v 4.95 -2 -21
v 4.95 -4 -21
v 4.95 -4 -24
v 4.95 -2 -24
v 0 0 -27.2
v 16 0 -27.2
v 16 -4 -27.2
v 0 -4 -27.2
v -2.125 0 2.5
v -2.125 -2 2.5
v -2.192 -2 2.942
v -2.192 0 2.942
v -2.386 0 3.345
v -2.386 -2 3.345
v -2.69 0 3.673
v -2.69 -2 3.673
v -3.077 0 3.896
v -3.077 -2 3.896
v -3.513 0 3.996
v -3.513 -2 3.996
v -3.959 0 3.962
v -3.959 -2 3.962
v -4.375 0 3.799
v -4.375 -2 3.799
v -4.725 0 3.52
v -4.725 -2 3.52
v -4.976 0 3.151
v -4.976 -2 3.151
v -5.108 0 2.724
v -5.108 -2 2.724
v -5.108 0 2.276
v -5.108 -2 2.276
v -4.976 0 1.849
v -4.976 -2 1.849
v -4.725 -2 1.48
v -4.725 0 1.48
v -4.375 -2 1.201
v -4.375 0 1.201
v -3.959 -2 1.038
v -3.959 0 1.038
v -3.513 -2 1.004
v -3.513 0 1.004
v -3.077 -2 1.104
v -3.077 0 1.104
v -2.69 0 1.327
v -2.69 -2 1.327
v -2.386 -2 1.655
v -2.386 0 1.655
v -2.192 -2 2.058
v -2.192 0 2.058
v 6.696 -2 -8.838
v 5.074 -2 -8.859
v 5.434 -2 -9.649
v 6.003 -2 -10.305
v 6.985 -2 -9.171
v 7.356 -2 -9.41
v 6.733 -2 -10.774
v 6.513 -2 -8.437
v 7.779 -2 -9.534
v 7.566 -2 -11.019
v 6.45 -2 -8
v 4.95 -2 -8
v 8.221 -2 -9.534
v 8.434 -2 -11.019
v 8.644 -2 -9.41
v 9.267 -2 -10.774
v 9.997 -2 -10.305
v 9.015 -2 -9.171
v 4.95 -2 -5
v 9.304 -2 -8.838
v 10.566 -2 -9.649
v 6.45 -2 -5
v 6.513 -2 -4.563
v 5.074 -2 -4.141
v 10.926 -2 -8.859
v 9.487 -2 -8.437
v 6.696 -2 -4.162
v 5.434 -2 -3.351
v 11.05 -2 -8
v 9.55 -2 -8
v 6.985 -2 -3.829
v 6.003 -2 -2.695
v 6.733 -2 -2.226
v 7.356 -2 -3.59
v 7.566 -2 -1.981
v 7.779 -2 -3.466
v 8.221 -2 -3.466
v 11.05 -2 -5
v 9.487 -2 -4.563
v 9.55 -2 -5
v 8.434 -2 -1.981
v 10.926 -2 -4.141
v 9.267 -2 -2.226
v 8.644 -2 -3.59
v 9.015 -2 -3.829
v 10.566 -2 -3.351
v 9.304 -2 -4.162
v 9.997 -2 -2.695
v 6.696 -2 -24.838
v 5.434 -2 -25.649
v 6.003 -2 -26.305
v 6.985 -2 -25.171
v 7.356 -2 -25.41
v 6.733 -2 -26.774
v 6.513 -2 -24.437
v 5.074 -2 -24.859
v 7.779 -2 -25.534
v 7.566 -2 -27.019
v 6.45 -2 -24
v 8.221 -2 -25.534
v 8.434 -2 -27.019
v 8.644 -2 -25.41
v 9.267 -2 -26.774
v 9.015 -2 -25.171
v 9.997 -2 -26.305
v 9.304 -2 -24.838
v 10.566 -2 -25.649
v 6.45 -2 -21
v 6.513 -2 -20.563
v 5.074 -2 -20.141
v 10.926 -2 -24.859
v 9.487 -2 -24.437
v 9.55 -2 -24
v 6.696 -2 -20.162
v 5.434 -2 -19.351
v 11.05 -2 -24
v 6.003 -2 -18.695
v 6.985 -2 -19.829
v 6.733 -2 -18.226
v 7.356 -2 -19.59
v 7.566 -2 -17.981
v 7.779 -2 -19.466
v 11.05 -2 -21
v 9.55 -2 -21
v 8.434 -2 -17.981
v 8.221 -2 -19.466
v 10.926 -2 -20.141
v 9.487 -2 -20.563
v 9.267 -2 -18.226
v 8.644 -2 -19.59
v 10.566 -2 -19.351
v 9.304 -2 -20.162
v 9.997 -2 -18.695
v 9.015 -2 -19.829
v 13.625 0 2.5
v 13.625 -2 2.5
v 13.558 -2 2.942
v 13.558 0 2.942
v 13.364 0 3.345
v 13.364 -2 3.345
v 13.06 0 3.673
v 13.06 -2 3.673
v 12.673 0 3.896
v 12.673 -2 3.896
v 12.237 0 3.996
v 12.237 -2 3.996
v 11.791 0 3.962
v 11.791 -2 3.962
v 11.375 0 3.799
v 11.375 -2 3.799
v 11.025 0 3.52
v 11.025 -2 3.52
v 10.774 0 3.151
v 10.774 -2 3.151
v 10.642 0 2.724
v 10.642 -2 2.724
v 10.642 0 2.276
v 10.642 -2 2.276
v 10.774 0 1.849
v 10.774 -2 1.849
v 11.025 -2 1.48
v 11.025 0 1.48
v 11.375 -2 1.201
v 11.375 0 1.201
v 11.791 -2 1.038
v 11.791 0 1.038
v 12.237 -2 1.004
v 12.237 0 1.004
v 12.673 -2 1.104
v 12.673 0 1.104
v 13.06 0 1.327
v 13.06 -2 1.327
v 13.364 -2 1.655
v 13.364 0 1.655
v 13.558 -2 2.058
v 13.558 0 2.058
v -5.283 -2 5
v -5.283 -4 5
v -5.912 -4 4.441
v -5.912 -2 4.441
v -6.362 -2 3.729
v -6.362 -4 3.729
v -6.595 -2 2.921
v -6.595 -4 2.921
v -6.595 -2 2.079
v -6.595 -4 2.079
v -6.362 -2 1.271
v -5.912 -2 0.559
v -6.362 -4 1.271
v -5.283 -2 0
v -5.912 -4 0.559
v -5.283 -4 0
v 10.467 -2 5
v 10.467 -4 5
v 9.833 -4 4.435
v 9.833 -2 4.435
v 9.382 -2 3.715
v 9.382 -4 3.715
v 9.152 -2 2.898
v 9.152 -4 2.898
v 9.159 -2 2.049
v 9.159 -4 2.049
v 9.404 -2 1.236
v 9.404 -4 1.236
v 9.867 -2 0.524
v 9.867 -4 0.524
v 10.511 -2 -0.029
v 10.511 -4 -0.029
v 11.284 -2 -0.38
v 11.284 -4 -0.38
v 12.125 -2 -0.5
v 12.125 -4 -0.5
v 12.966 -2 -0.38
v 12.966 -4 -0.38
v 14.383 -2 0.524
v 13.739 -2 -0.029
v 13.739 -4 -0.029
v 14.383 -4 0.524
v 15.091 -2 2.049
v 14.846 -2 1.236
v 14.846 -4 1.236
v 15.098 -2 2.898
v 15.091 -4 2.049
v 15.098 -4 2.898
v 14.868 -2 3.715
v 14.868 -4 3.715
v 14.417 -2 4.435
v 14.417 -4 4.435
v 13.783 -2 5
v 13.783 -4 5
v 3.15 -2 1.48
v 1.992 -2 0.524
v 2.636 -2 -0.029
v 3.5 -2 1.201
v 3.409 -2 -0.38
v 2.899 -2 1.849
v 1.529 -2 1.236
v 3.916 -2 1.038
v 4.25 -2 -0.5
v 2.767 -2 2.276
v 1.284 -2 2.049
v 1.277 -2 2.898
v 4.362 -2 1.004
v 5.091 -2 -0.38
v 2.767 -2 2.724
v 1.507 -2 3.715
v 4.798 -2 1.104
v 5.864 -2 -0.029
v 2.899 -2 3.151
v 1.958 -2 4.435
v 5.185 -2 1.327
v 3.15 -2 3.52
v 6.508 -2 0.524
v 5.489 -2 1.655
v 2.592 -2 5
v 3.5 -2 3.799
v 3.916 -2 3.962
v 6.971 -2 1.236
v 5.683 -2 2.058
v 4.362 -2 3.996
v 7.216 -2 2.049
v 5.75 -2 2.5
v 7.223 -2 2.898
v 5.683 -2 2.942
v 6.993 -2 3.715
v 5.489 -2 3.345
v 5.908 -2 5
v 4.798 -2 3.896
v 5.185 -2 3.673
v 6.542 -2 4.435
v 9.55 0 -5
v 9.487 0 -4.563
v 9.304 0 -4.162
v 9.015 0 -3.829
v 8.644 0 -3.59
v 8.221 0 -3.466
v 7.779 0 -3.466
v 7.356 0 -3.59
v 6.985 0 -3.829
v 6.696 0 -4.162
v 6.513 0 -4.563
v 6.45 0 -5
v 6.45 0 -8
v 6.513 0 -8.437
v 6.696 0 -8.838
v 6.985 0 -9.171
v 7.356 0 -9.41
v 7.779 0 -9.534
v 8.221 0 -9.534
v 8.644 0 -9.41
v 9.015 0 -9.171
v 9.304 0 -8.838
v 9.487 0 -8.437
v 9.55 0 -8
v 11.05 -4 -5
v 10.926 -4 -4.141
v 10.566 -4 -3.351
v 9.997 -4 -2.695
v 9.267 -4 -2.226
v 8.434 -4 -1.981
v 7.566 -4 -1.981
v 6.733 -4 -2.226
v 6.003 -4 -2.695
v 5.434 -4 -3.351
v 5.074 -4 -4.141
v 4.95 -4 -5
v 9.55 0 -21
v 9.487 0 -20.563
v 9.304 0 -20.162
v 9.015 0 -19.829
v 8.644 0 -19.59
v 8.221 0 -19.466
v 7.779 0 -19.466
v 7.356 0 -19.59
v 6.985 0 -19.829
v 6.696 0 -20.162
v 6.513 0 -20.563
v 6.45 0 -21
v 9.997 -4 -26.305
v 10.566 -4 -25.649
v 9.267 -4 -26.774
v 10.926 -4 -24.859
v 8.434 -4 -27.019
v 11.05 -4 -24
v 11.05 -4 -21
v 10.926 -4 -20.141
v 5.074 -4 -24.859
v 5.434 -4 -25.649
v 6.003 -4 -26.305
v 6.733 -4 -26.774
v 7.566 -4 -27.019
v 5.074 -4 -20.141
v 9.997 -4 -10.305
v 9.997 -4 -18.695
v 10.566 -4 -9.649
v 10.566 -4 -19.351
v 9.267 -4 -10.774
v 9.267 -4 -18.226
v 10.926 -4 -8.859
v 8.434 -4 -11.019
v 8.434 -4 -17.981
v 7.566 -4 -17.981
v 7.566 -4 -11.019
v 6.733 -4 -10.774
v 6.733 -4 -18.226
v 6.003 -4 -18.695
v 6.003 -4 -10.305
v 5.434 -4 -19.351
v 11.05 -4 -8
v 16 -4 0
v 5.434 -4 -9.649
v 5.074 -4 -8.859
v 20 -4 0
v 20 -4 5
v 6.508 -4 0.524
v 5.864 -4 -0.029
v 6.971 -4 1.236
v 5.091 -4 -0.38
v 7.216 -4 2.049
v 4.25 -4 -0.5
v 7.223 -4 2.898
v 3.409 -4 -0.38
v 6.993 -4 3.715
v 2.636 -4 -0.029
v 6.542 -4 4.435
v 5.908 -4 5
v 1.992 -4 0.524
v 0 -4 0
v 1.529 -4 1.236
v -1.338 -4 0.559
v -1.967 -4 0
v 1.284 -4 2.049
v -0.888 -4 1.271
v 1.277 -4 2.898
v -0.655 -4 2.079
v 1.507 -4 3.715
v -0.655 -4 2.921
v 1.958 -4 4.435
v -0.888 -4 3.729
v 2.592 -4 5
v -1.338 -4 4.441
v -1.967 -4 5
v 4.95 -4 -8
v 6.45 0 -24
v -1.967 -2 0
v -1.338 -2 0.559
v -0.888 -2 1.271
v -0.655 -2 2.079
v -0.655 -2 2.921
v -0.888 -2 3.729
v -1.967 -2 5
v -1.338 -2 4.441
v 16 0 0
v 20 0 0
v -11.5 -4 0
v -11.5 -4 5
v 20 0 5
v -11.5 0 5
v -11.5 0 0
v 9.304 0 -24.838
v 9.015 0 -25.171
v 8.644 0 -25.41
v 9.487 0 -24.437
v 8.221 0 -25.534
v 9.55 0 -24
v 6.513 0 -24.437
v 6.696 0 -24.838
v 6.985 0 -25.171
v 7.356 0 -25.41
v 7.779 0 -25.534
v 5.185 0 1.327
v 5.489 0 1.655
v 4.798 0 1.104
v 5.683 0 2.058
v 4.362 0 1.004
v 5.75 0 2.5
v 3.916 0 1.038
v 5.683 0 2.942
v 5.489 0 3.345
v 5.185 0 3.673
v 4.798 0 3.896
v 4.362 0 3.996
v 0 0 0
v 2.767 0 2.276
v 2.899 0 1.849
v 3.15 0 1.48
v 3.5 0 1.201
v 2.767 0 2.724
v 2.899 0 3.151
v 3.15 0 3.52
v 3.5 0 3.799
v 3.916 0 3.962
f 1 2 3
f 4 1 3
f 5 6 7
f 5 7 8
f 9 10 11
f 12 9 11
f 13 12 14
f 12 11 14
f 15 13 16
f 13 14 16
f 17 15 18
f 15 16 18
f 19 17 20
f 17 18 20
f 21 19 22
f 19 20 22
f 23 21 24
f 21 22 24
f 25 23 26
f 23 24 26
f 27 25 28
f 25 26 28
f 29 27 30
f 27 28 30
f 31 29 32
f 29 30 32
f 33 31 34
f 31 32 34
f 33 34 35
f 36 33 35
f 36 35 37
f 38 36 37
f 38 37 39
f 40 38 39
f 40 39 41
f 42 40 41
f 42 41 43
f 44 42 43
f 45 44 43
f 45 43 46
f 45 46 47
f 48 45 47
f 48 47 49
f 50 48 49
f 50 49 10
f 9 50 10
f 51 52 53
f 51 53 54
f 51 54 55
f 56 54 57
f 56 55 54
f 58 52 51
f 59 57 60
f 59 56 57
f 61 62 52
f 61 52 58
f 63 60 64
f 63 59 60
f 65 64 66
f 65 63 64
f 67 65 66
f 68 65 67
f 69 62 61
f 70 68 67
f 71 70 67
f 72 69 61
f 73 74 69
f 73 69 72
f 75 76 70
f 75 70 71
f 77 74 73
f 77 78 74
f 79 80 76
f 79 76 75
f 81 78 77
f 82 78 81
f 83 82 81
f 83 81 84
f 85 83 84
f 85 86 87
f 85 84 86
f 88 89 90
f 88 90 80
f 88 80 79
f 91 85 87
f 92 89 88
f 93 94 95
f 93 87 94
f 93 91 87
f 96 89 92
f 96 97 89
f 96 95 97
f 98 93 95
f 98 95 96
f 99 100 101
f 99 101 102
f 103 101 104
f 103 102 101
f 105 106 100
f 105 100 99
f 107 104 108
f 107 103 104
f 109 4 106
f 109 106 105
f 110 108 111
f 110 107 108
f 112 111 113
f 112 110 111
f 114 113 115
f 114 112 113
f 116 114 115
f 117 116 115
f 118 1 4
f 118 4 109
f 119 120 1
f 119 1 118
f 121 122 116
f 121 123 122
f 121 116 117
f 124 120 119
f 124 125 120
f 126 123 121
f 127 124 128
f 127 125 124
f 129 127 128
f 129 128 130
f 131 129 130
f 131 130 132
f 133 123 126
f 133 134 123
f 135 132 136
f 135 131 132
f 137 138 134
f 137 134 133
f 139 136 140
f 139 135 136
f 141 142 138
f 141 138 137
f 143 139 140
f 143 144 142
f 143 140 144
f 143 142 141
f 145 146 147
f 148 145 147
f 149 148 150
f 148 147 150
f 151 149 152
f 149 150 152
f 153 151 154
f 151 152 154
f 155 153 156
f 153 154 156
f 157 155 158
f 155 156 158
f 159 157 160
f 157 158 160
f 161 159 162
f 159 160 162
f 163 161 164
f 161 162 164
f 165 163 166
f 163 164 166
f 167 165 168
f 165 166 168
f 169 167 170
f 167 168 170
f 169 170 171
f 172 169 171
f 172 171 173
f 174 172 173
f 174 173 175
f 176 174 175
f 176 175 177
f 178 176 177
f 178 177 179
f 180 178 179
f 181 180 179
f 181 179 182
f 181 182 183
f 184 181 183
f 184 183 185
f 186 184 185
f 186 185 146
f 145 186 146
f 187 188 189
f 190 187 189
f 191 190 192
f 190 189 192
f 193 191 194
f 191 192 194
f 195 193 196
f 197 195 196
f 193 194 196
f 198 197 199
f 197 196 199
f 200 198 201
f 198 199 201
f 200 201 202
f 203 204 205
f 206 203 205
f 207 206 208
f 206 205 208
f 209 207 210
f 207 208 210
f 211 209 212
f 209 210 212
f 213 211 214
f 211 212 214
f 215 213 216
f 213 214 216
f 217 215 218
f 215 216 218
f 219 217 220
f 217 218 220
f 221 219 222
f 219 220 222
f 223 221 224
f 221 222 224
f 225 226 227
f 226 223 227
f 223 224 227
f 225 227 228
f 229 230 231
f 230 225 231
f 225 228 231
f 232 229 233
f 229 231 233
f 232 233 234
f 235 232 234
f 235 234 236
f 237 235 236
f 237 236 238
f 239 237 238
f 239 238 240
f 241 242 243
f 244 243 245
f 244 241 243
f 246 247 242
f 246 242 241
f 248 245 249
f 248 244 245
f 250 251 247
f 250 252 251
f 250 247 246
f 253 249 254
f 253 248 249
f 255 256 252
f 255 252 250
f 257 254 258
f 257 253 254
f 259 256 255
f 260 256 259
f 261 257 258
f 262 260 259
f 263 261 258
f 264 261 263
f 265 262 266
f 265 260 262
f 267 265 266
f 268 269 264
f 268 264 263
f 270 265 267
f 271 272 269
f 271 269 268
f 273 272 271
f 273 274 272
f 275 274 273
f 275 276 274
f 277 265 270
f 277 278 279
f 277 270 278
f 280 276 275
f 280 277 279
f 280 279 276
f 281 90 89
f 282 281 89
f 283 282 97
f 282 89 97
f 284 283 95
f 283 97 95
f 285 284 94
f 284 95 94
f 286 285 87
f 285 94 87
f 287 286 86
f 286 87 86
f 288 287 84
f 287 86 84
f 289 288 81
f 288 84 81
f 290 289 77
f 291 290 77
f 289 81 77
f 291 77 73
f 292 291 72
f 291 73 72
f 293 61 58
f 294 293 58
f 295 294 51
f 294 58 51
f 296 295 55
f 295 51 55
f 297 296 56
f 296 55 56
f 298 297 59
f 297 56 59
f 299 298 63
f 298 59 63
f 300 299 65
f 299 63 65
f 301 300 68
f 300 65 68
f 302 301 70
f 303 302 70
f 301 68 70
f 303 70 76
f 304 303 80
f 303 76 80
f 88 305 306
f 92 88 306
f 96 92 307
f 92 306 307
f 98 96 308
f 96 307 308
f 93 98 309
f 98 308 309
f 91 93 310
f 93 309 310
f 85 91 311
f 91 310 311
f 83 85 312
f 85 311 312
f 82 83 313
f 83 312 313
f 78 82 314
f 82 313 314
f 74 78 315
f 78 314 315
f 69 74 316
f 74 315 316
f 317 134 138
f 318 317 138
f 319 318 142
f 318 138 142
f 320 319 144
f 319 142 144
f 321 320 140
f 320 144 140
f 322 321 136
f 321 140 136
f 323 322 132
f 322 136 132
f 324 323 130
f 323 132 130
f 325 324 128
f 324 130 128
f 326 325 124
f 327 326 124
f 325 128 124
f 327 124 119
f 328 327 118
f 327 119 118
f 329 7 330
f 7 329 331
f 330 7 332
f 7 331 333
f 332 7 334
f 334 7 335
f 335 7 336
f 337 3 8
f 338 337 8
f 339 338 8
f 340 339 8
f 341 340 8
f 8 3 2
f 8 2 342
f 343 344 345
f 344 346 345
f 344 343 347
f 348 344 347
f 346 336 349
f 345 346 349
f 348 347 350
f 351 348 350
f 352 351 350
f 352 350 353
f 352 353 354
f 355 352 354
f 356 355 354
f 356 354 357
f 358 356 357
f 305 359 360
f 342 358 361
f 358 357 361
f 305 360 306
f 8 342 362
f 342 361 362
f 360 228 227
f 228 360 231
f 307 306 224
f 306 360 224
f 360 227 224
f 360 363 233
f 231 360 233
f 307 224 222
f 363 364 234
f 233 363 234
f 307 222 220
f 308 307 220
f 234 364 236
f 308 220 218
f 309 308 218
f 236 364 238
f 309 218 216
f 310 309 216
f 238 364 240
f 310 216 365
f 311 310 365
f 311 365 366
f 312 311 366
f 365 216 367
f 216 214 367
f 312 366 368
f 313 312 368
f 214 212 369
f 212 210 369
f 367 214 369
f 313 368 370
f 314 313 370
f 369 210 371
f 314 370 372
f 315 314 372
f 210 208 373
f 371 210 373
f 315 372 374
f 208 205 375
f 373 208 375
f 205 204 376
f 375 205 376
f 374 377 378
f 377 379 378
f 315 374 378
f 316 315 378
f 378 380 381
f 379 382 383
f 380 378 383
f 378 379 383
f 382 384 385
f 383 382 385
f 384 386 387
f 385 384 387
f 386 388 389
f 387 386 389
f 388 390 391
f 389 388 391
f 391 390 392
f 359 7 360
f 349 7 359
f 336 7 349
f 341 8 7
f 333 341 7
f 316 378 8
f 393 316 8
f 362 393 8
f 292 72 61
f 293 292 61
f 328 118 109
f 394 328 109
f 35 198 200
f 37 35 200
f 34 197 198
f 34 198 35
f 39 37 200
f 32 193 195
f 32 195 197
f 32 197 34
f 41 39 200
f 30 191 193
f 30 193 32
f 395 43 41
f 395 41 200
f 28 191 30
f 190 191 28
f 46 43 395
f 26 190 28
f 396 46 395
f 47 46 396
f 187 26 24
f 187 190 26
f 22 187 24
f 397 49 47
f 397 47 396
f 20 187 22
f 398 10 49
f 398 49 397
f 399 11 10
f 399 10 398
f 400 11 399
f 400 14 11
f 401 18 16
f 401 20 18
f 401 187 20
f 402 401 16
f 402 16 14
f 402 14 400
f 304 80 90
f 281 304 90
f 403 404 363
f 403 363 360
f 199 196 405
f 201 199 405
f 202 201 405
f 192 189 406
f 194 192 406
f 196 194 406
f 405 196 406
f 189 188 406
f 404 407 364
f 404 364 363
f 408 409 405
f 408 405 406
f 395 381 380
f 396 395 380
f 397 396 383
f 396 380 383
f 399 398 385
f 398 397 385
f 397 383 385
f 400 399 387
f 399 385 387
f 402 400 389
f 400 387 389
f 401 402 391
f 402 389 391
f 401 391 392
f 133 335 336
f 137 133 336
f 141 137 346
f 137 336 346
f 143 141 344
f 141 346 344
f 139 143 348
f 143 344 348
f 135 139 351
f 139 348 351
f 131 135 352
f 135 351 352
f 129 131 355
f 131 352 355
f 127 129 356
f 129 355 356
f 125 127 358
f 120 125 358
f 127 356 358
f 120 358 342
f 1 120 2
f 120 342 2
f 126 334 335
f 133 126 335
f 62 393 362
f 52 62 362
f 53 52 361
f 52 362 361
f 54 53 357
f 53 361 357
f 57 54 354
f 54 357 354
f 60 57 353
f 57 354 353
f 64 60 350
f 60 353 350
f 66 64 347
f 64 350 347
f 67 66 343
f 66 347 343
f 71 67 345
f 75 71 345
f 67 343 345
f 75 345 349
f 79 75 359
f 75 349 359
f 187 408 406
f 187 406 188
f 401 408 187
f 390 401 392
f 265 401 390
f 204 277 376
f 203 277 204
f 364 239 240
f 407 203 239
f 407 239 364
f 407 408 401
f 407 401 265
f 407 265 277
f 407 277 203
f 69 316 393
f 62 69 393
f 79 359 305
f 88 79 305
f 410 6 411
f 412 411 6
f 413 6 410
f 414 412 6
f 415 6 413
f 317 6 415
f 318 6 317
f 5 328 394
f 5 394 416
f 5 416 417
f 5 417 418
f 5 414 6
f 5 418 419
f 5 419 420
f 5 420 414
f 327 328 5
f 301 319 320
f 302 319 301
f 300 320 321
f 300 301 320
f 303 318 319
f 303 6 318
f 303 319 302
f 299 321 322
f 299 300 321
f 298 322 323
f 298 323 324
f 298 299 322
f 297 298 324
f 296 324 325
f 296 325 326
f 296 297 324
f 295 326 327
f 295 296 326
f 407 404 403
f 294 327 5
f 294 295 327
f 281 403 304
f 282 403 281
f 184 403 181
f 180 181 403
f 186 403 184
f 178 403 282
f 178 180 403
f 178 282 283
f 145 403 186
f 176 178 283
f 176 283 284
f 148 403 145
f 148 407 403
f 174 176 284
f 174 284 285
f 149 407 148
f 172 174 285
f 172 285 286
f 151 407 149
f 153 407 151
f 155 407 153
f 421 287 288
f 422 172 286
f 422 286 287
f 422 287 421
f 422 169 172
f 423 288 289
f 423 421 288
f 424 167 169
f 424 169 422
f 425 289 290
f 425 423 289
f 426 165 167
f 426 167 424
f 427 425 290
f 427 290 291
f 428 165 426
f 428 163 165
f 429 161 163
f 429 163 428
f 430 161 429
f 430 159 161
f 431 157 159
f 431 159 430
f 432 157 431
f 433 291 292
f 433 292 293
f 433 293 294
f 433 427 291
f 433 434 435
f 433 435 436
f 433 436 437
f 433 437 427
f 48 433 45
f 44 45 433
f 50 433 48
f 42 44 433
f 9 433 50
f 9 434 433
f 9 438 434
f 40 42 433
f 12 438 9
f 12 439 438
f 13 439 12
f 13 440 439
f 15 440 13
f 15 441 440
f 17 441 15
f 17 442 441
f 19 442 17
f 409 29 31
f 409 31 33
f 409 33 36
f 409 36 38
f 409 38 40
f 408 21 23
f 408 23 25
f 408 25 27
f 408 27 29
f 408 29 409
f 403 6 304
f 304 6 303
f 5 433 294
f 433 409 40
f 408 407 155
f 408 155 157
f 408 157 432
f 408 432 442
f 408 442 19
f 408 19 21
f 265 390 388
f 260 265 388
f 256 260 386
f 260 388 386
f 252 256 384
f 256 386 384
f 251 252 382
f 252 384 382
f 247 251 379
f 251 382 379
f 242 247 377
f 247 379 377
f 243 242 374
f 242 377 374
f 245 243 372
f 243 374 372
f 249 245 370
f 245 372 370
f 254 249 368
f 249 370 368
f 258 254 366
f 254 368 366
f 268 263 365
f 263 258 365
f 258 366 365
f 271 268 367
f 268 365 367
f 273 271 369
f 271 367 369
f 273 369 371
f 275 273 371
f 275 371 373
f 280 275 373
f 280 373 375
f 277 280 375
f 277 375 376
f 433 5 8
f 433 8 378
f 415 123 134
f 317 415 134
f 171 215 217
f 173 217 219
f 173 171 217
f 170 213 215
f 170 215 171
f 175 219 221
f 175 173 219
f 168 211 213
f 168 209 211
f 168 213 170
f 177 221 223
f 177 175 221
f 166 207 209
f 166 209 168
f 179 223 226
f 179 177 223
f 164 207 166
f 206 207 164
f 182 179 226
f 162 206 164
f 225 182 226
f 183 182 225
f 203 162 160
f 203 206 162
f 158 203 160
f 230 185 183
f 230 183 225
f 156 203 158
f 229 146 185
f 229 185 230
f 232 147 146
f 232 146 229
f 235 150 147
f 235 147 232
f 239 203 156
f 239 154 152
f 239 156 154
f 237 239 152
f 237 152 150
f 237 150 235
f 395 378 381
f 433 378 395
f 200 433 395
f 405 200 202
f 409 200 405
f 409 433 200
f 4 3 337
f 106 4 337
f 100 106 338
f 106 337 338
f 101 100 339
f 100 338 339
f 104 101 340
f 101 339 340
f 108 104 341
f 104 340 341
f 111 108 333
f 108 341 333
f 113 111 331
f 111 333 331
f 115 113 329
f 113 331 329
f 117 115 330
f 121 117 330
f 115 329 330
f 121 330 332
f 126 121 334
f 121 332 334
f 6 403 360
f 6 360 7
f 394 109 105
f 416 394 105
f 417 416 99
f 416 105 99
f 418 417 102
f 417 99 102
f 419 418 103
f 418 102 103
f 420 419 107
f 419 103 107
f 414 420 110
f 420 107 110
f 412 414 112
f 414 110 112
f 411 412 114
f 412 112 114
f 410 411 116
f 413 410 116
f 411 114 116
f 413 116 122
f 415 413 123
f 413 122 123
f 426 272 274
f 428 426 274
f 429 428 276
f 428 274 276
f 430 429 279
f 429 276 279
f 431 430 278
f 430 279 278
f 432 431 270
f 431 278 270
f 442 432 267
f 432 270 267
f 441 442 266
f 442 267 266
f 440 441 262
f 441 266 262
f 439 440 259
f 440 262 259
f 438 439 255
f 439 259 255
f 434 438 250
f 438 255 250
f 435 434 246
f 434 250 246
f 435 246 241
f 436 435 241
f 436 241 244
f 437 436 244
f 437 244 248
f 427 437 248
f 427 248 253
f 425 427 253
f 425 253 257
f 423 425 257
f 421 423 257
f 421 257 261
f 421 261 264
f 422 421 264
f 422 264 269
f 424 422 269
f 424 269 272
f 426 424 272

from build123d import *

# Parameters (mm, degrees)
PAD_DEPTH       = 4
SKETCH001_R     = 1.5
POCKET_DEPTH    = 4.001
POCKET001_DEPTH = 4.001
SKETCH003_R     = 3
POCKET002_DEPTH = 2


with BuildPart() as part:
    # Sketch → Pad (new body)
    with BuildSketch(Plane.XZ):
        Polygon((16, 0), (16, -27.2), (0, -27.2), (0, 0), (-11.5, 0), (-11.5, 5), (20, 5), (20, 0), align=None)
    extrude(amount=PAD_DEPTH)

    # Sketch001 (on Face10 of Pad) → Pocket (cut, through all)
    with BuildSketch(Plane.XZ.offset(4)):
        with Locations((-3.625, 2.5)):
            Circle(SKETCH001_R)
        with Locations((4.25, 2.5)):
            Circle(SKETCH001_R)
        with Locations((12.125, 2.5)):
            Circle(SKETCH001_R)
    extrude(amount=-POCKET_DEPTH, mode=Mode.SUBTRACT)

    # Sketch002 (on Face5 of Pocket) → Pocket001 (cut, through all)
    with BuildSketch(Plane.XZ.offset(4)):
        with BuildLine():
            ThreePointArc((9.55, -5), (8, -3.45), (6.45, -5))
            Line((6.45, -5), (6.45, -8))
            ThreePointArc((6.45, -8), (8, -9.55), (9.55, -8))
            Line((9.55, -8), (9.55, -5))
        make_face()
        with BuildLine():
            ThreePointArc((9.55, -21), (8, -19.45), (6.45, -21))
            Line((6.45, -21), (6.45, -24))
            ThreePointArc((6.45, -24), (8, -25.55), (9.55, -24))
            Line((9.55, -24), (9.55, -21))
        make_face()
    extrude(amount=-POCKET001_DEPTH, mode=Mode.SUBTRACT)

    # Sketch003 (on Face5 of Pocket001) → Pocket002 (cut)
    with BuildSketch(Plane.XZ.offset(4)):
        with Locations((-3.625, 2.5)):
            Circle(SKETCH003_R)
        with Locations((4.25, 2.5)):
            Circle(SKETCH003_R)
        with Locations((12.125, 2.5)):
            Circle(SKETCH003_R)
        with BuildLine():
            ThreePointArc((11.05, -5), (8, -1.95), (4.95, -5))
            Line((4.95, -5), (4.95, -8))
            ThreePointArc((4.95, -8), (8, -11.05), (11.05, -8))
            Line((11.05, -8), (11.05, -5))
        make_face()
        with BuildLine():
            ThreePointArc((11.05, -21), (8, -17.95), (4.95, -21))
            Line((4.95, -21), (4.95, -24))
            ThreePointArc((4.95, -24), (8, -27.05), (11.05, -24))
            Line((11.05, -24), (11.05, -21))
        make_face()
    extrude(amount=-POCKET002_DEPTH, mode=Mode.SUBTRACT)


solid = part.part
